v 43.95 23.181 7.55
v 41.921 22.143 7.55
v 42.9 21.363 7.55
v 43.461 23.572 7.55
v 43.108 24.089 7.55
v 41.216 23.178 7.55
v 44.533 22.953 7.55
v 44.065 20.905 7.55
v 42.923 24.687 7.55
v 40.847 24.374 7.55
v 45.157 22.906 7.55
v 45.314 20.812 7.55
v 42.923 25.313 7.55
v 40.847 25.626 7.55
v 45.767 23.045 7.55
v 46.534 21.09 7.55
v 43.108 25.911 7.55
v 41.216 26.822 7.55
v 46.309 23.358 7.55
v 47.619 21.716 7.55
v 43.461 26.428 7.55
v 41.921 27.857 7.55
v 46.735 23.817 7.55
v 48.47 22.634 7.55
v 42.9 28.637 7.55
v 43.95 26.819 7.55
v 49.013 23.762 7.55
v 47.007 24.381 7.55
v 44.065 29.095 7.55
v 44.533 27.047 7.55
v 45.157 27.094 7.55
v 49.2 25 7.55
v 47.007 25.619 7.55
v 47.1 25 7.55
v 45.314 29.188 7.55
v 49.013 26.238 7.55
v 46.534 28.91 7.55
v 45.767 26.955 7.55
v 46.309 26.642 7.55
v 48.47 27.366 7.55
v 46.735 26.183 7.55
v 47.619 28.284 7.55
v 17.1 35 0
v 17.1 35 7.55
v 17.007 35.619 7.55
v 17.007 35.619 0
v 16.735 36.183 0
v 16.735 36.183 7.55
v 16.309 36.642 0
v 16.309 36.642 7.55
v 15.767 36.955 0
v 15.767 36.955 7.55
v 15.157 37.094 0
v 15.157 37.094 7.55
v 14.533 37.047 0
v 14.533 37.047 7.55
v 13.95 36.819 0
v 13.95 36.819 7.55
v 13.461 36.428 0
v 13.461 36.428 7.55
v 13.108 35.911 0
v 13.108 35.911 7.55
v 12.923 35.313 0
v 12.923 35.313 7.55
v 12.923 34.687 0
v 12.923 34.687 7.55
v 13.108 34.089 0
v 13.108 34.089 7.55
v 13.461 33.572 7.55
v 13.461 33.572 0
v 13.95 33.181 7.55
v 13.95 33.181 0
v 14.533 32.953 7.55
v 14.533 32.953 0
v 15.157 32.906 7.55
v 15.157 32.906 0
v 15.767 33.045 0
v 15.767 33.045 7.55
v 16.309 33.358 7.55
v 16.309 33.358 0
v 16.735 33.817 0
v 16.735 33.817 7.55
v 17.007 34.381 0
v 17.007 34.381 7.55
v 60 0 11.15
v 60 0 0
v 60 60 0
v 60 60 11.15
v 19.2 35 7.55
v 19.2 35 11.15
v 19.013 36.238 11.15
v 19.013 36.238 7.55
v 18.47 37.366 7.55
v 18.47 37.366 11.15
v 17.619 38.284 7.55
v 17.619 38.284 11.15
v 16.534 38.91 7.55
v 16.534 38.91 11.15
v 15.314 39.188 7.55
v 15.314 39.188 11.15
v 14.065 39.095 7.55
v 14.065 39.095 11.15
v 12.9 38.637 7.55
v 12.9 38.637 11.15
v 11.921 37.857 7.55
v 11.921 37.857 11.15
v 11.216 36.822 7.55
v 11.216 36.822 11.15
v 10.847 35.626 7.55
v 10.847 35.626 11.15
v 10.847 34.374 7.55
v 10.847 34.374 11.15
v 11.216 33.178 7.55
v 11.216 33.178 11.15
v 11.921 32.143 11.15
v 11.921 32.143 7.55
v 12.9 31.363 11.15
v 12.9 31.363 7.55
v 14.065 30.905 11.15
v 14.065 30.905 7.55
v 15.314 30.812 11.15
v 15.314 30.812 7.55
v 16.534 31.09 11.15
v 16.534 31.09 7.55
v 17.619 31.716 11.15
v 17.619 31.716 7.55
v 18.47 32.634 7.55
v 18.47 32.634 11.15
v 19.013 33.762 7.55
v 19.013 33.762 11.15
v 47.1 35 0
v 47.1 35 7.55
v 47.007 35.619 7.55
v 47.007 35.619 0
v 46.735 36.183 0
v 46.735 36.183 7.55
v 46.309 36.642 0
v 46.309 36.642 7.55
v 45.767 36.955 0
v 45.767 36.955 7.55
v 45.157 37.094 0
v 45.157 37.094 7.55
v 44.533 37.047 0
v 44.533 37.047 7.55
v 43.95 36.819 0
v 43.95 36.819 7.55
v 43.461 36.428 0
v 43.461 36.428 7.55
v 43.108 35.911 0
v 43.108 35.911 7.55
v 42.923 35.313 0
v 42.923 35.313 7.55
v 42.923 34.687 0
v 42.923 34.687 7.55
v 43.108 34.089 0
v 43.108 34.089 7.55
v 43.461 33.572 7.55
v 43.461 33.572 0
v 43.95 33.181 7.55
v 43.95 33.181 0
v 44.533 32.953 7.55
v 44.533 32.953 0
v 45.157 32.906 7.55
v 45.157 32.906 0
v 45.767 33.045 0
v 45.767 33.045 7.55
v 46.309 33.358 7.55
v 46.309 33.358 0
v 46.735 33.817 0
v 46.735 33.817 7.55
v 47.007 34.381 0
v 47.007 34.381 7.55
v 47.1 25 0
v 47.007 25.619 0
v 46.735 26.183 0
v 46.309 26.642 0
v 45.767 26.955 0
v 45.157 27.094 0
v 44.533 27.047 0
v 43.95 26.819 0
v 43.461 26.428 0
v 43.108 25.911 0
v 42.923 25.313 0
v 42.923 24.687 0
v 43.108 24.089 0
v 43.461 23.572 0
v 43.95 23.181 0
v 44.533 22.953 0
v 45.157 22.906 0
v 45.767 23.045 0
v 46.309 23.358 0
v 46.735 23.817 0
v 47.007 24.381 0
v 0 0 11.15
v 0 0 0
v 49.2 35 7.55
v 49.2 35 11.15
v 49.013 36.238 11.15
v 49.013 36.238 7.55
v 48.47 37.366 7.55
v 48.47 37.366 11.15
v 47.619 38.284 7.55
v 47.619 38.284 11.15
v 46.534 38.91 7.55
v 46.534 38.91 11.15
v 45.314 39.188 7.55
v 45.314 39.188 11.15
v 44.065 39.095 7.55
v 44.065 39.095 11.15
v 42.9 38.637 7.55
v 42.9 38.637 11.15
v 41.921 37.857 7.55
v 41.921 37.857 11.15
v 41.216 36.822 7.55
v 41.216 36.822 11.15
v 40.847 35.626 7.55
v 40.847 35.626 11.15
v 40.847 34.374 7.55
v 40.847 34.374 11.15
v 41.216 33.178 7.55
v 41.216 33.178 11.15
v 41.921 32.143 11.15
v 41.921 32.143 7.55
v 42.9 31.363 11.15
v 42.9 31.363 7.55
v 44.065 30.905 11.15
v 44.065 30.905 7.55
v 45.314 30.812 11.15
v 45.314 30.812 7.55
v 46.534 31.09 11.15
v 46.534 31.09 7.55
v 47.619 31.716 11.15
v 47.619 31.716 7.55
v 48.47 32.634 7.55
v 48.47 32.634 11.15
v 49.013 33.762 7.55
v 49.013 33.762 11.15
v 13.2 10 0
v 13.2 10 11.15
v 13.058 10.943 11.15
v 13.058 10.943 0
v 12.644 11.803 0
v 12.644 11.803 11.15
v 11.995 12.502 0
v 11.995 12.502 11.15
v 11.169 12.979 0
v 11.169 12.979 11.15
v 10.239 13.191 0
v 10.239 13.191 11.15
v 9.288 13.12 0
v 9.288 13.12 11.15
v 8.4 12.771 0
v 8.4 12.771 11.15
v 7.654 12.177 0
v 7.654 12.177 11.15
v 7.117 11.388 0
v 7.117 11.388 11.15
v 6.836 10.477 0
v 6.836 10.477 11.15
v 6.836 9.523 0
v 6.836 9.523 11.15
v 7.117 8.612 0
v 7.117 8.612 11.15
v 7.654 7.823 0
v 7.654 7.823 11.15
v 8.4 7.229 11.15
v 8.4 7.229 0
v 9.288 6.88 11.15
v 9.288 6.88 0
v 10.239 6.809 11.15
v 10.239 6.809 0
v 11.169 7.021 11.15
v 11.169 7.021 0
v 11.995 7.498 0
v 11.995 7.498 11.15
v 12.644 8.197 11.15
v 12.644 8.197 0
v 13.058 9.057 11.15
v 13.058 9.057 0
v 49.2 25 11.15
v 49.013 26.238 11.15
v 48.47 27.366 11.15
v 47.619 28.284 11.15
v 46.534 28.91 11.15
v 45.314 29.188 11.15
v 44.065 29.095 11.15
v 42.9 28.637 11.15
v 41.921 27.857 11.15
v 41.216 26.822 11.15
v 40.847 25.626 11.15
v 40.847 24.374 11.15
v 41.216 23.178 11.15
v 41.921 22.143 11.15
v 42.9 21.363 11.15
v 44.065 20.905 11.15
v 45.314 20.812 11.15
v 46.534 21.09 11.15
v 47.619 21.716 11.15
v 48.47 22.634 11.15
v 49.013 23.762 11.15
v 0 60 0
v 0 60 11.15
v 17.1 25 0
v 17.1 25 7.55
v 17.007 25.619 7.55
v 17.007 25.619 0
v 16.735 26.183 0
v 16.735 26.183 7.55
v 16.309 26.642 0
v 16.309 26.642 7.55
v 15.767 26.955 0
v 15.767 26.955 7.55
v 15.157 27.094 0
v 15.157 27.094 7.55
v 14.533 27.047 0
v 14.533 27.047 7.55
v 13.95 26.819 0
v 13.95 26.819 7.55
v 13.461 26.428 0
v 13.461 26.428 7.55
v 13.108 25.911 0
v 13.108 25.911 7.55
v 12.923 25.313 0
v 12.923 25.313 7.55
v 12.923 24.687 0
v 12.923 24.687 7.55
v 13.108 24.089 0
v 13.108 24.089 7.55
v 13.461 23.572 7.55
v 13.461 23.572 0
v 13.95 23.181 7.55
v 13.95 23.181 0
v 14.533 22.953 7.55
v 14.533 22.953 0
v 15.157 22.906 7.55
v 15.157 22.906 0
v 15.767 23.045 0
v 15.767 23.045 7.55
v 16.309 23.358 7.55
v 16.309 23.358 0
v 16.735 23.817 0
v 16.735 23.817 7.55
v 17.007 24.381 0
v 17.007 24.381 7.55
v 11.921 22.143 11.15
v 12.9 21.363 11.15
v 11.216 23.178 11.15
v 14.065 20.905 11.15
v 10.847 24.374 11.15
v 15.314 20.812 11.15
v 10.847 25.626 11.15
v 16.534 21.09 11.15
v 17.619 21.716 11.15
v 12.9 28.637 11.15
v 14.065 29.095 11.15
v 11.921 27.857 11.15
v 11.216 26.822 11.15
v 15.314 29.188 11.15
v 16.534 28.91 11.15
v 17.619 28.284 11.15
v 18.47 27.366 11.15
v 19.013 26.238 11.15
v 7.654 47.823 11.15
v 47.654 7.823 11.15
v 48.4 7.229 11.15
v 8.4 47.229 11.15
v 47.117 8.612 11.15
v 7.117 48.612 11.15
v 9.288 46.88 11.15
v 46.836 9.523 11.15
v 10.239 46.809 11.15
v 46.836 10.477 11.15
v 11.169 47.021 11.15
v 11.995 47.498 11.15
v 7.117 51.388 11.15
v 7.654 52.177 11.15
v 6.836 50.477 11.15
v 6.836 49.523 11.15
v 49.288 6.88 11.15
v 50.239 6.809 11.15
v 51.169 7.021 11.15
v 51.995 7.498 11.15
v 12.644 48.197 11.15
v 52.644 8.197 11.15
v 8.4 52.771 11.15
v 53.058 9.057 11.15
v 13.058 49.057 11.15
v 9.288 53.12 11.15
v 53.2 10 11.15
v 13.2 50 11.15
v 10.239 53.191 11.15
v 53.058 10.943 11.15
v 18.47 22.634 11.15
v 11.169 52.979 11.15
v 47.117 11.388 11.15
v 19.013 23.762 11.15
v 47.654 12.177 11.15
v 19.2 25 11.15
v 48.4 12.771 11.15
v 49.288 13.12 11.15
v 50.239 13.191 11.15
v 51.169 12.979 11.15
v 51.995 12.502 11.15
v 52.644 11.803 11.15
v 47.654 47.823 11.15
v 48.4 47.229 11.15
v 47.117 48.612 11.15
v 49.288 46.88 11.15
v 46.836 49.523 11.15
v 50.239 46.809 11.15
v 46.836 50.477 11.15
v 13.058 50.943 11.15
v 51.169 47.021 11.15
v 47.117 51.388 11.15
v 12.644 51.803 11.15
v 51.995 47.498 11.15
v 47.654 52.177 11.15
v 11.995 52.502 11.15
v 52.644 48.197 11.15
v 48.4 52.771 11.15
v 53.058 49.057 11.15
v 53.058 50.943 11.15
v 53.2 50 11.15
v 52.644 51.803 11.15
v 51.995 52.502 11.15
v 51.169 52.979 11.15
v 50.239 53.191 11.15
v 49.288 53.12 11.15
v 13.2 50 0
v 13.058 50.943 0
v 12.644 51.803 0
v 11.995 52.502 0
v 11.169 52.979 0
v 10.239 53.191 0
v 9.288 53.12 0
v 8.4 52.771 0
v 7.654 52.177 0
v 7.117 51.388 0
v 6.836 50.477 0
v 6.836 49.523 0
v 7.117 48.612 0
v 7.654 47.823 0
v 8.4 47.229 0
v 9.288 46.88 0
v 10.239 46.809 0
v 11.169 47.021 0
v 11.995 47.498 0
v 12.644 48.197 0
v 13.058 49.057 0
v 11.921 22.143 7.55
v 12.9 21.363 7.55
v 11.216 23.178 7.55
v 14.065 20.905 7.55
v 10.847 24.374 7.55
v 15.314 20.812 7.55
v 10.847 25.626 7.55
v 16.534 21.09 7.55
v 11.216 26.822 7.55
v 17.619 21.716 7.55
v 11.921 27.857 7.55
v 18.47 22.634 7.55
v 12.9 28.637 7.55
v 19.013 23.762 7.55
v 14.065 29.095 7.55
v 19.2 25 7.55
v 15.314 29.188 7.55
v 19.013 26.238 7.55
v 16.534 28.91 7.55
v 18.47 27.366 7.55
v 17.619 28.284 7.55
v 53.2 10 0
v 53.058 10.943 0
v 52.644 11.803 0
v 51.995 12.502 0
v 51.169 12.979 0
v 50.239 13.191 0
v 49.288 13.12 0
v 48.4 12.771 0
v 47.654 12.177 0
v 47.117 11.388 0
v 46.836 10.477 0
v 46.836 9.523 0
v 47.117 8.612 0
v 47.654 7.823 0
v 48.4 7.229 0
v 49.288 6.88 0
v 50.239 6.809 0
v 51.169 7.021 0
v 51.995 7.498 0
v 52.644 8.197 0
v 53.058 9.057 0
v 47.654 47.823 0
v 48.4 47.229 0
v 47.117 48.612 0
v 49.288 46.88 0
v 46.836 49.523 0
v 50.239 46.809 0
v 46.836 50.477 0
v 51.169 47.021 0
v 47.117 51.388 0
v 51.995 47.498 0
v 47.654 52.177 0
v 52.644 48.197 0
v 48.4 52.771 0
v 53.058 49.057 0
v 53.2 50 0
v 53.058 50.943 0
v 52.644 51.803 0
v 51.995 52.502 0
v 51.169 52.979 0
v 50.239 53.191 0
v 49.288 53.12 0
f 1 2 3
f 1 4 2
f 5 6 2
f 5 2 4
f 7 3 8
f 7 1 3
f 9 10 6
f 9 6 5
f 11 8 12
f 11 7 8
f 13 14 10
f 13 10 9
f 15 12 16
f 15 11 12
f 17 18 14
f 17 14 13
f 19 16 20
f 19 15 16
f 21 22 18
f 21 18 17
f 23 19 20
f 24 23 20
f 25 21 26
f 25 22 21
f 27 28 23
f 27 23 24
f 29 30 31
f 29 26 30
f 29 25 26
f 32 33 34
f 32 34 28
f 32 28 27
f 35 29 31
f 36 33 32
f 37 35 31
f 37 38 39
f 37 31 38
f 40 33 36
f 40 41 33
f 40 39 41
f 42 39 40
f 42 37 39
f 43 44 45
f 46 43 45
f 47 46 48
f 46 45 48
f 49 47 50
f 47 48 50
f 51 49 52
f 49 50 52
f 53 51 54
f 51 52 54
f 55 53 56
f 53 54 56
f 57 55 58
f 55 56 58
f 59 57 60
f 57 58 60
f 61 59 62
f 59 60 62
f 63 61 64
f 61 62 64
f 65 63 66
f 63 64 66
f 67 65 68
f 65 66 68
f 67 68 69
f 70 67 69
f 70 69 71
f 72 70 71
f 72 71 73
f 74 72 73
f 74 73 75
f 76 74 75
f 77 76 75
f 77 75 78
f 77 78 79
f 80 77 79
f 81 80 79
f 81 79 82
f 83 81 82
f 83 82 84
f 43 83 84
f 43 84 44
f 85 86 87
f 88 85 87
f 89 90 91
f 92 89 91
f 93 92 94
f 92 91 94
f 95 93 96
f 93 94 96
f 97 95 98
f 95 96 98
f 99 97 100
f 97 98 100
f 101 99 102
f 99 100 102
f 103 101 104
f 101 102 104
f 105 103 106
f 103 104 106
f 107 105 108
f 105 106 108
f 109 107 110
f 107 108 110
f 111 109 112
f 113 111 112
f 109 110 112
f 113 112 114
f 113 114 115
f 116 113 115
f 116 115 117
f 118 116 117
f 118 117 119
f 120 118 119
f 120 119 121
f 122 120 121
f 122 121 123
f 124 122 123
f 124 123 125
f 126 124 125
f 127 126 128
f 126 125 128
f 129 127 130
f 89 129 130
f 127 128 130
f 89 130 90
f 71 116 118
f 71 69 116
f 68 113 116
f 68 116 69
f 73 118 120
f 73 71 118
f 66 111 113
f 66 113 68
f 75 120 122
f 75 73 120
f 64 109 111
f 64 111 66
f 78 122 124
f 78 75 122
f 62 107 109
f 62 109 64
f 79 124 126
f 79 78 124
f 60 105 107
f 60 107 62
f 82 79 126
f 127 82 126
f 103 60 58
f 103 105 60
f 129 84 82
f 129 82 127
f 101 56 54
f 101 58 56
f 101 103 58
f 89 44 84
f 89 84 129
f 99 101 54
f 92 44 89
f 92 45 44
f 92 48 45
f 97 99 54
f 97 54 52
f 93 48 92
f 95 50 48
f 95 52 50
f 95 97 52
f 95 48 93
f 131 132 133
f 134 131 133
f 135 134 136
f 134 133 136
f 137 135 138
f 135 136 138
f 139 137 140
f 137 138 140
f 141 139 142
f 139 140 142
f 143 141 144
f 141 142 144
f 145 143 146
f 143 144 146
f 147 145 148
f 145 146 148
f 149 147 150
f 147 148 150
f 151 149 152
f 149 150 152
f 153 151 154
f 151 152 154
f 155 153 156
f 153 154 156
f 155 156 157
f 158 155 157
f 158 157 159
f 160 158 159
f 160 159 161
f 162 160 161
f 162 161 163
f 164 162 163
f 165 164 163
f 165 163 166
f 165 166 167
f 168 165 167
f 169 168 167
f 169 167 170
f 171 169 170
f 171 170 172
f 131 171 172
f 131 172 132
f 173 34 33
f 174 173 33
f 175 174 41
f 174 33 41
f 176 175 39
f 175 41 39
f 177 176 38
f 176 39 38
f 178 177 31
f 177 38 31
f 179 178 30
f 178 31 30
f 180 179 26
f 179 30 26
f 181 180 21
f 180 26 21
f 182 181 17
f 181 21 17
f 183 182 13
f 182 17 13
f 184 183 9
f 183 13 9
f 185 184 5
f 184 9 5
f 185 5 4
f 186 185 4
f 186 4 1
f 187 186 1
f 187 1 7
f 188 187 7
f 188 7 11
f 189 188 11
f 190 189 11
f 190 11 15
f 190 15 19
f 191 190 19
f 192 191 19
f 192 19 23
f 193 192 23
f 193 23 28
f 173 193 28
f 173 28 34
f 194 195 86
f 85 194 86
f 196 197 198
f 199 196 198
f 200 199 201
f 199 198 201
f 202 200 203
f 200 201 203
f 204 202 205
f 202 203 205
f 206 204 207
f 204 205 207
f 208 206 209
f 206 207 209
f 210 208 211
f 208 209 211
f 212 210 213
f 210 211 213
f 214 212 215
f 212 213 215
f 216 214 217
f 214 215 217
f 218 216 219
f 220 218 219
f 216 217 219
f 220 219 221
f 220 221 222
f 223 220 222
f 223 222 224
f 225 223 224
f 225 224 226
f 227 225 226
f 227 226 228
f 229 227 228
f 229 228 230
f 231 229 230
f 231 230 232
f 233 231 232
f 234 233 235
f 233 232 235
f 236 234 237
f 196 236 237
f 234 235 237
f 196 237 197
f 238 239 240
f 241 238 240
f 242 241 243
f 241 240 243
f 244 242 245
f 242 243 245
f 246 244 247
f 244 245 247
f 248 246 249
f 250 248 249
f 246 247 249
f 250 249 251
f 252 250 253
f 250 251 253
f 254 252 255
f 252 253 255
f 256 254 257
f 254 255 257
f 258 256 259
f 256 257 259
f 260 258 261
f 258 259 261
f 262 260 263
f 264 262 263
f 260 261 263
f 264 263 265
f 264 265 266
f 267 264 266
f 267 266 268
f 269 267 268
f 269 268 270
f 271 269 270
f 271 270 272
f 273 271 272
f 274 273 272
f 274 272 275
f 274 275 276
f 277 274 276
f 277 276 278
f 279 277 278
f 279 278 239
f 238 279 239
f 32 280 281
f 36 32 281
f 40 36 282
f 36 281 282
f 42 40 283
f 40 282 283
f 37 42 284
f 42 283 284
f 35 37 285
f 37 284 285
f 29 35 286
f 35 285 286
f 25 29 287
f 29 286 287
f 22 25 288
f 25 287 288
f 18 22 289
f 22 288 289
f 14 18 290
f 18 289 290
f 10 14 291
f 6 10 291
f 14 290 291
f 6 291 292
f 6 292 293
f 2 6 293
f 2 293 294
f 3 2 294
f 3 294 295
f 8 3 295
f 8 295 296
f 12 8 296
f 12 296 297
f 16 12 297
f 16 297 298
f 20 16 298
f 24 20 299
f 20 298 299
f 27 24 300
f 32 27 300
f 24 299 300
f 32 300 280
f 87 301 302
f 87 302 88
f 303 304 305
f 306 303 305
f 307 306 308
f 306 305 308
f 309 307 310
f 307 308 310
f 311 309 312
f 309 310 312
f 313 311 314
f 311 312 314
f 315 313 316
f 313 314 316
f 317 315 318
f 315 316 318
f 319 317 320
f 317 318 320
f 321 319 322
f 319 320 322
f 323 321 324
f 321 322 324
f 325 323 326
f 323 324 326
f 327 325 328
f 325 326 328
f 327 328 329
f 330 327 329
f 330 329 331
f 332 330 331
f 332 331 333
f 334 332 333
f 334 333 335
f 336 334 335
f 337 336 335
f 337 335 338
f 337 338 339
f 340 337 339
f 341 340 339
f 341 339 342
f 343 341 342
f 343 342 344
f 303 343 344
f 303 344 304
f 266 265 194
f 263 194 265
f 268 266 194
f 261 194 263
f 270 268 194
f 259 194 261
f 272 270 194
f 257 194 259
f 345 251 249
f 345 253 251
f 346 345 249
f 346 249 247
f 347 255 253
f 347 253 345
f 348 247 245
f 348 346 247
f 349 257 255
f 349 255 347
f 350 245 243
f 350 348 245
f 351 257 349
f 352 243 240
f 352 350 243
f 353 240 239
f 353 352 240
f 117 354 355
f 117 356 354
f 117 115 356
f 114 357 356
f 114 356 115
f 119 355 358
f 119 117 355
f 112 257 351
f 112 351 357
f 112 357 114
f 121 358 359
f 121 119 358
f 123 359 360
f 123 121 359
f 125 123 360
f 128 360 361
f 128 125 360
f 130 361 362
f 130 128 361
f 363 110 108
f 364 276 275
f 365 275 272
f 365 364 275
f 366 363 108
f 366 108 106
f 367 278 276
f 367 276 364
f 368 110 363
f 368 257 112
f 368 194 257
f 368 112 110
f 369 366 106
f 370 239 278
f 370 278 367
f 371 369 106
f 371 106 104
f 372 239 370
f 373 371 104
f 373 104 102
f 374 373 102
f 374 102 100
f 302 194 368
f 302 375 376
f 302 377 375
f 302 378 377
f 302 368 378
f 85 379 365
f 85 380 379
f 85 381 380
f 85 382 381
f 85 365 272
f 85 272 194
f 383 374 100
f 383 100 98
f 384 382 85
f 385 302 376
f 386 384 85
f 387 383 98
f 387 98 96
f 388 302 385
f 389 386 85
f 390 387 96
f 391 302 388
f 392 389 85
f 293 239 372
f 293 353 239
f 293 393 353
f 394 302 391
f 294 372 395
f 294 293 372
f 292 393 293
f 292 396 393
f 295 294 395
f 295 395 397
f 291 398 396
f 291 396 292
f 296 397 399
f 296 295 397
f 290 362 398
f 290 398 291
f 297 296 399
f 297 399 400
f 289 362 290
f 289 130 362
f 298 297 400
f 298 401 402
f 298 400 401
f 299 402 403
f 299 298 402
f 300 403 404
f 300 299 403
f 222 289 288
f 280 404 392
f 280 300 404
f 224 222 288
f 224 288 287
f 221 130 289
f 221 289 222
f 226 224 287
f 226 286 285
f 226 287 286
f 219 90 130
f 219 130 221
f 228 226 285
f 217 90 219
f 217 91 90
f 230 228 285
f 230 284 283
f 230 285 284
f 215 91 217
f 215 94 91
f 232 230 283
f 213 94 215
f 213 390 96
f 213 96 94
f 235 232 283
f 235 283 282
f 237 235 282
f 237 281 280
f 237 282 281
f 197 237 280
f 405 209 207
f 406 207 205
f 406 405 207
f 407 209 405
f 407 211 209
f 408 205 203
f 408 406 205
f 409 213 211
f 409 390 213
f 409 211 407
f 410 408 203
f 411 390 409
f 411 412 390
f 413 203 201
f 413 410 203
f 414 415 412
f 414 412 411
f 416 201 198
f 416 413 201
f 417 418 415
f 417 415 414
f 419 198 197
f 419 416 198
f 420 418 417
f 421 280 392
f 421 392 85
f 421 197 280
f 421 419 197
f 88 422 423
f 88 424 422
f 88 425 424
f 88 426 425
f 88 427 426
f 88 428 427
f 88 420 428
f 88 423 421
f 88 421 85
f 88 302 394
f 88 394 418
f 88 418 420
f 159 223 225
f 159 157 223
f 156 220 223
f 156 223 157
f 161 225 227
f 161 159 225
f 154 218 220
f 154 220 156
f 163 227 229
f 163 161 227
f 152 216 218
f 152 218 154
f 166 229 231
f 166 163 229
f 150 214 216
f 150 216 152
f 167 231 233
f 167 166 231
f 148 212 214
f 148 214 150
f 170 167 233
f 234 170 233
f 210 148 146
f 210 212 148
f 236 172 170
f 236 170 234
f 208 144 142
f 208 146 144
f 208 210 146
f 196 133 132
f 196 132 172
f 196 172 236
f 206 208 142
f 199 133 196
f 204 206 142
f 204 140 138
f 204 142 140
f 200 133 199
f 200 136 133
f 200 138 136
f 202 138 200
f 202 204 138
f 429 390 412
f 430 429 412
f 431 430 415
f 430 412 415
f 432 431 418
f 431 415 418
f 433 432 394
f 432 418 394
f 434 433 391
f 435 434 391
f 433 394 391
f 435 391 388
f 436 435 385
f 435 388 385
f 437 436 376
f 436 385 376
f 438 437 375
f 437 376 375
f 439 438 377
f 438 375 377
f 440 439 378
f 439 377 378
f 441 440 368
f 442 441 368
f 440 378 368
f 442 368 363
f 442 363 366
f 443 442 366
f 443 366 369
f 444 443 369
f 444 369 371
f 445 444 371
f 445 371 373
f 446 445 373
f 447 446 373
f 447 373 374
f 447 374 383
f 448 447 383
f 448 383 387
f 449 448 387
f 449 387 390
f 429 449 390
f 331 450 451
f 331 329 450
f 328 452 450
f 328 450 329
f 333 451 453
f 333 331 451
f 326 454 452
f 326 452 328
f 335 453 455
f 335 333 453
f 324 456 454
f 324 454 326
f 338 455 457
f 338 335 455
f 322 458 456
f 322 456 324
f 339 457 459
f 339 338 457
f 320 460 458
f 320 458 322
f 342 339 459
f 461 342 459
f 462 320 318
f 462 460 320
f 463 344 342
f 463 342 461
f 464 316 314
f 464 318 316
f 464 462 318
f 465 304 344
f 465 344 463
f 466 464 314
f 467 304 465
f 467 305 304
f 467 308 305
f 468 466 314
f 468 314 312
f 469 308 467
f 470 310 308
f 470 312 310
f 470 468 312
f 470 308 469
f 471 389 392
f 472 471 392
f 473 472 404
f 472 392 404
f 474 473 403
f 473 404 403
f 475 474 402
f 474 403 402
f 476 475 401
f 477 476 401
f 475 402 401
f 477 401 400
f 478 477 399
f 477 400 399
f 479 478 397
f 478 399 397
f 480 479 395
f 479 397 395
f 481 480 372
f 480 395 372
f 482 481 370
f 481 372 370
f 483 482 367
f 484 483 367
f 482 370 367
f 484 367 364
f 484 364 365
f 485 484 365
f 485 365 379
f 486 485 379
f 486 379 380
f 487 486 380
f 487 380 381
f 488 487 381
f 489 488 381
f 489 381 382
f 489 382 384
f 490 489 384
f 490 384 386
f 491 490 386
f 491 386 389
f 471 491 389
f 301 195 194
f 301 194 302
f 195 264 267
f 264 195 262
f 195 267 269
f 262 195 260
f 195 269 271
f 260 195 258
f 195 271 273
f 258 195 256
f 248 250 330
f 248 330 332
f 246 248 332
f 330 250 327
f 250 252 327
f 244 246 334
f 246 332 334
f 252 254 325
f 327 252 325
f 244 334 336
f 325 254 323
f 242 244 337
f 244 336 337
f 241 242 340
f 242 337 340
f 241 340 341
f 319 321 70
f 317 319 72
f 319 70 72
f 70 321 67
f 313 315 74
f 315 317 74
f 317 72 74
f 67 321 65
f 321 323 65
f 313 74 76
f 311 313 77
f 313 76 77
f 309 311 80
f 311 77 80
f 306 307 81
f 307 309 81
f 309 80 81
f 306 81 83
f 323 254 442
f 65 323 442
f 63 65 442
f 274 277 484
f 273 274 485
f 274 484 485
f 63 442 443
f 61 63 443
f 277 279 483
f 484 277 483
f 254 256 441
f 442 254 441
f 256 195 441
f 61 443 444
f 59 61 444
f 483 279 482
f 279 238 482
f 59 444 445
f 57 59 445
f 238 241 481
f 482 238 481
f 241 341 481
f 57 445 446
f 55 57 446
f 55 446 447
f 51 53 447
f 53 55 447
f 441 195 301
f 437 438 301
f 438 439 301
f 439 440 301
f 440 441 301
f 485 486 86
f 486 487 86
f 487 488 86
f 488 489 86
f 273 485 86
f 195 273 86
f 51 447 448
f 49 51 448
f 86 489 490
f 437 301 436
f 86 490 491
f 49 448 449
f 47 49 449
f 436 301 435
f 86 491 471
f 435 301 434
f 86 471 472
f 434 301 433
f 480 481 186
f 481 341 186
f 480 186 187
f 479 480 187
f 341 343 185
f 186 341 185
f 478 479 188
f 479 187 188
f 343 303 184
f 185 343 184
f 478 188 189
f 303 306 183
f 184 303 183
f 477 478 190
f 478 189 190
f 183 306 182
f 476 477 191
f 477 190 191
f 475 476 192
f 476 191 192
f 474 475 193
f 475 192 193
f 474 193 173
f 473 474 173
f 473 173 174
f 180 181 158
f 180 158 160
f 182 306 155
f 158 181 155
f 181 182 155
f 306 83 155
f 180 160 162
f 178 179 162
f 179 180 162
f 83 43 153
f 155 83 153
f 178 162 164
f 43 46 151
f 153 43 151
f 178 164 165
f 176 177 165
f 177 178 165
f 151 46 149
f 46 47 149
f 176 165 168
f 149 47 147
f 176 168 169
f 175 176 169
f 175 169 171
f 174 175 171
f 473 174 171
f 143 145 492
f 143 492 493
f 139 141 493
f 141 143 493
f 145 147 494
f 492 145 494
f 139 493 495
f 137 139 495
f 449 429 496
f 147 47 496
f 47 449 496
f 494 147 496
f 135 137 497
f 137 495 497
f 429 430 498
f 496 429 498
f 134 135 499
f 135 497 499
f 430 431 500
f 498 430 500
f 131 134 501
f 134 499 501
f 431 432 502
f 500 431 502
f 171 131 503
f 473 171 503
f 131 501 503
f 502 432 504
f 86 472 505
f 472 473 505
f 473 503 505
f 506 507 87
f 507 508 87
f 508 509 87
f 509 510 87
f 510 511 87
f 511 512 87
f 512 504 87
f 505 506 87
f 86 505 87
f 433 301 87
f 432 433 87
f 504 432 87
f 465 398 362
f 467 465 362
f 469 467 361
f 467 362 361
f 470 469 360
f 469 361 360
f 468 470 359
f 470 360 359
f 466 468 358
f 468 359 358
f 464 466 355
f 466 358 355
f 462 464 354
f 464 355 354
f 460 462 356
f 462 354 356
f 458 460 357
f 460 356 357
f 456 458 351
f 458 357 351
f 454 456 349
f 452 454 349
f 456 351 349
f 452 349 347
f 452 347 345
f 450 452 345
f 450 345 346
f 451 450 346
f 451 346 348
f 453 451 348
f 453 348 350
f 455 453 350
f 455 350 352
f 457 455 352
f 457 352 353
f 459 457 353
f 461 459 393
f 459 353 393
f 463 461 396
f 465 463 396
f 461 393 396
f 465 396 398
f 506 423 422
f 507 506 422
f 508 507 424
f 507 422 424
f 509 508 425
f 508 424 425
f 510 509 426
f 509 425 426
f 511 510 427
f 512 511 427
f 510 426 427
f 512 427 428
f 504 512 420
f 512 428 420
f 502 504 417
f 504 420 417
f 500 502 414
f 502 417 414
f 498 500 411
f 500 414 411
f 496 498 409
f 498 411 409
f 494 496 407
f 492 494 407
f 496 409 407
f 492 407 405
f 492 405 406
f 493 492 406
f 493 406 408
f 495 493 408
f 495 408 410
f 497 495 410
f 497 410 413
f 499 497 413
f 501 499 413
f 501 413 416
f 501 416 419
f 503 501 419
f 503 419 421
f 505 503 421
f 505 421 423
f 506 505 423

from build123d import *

# Parameters (mm, degrees)
SKETCH_W        = 60
SKETCH_H        = 60
PAD_DEPTH       = 11.15
SKETCH001_R     = 2.1
SKETCH001_R_2   = 3.2
POCKET_DEPTH    = 12
SKETCH002_R     = 4.2
POCKET001_DEPTH = 3.6


with BuildPart() as part:
    # Sketch → Pad (new body)
    with BuildSketch(Plane.XY):
        with Locations((30, 30)):
            Rectangle(SKETCH_W, SKETCH_H)
    extrude(amount=PAD_DEPTH)

    # Sketch001 (on Face6 of Pad) → Pocket (cut)
    with BuildSketch(Plane.XY.offset(11.15)):
        with Locations((15, 35)):
            Circle(SKETCH001_R)
        with Locations((45, 35)):
            Circle(SKETCH001_R)
        with Locations((15, 25)):
            Circle(SKETCH001_R)
        with Locations((45, 25)):
            Circle(SKETCH001_R)
        with Locations((10, 50)):
            Circle(SKETCH001_R_2)
        with Locations((50, 50)):
            Circle(SKETCH001_R_2)
        with Locations((10, 10)):
            Circle(SKETCH001_R_2)
        with Locations((50, 10)):
            Circle(SKETCH001_R_2)
    extrude(amount=-POCKET_DEPTH, mode=Mode.SUBTRACT)

    # Sketch002 (on Face5 of Pocket) → Pocket001 (cut)
    with BuildSketch(Plane.XY.offset(11.15)):
        with Locations((15, 35)):
            Circle(SKETCH002_R)
        with Locations((45, 35)):
            Circle(SKETCH002_R)
        with Locations((45, 25)):
            Circle(SKETCH002_R)
        with Locations((15, 25)):
            Circle(SKETCH002_R)
    extrude(amount=-POCKET001_DEPTH, mode=Mode.SUBTRACT)


solid = part.part
